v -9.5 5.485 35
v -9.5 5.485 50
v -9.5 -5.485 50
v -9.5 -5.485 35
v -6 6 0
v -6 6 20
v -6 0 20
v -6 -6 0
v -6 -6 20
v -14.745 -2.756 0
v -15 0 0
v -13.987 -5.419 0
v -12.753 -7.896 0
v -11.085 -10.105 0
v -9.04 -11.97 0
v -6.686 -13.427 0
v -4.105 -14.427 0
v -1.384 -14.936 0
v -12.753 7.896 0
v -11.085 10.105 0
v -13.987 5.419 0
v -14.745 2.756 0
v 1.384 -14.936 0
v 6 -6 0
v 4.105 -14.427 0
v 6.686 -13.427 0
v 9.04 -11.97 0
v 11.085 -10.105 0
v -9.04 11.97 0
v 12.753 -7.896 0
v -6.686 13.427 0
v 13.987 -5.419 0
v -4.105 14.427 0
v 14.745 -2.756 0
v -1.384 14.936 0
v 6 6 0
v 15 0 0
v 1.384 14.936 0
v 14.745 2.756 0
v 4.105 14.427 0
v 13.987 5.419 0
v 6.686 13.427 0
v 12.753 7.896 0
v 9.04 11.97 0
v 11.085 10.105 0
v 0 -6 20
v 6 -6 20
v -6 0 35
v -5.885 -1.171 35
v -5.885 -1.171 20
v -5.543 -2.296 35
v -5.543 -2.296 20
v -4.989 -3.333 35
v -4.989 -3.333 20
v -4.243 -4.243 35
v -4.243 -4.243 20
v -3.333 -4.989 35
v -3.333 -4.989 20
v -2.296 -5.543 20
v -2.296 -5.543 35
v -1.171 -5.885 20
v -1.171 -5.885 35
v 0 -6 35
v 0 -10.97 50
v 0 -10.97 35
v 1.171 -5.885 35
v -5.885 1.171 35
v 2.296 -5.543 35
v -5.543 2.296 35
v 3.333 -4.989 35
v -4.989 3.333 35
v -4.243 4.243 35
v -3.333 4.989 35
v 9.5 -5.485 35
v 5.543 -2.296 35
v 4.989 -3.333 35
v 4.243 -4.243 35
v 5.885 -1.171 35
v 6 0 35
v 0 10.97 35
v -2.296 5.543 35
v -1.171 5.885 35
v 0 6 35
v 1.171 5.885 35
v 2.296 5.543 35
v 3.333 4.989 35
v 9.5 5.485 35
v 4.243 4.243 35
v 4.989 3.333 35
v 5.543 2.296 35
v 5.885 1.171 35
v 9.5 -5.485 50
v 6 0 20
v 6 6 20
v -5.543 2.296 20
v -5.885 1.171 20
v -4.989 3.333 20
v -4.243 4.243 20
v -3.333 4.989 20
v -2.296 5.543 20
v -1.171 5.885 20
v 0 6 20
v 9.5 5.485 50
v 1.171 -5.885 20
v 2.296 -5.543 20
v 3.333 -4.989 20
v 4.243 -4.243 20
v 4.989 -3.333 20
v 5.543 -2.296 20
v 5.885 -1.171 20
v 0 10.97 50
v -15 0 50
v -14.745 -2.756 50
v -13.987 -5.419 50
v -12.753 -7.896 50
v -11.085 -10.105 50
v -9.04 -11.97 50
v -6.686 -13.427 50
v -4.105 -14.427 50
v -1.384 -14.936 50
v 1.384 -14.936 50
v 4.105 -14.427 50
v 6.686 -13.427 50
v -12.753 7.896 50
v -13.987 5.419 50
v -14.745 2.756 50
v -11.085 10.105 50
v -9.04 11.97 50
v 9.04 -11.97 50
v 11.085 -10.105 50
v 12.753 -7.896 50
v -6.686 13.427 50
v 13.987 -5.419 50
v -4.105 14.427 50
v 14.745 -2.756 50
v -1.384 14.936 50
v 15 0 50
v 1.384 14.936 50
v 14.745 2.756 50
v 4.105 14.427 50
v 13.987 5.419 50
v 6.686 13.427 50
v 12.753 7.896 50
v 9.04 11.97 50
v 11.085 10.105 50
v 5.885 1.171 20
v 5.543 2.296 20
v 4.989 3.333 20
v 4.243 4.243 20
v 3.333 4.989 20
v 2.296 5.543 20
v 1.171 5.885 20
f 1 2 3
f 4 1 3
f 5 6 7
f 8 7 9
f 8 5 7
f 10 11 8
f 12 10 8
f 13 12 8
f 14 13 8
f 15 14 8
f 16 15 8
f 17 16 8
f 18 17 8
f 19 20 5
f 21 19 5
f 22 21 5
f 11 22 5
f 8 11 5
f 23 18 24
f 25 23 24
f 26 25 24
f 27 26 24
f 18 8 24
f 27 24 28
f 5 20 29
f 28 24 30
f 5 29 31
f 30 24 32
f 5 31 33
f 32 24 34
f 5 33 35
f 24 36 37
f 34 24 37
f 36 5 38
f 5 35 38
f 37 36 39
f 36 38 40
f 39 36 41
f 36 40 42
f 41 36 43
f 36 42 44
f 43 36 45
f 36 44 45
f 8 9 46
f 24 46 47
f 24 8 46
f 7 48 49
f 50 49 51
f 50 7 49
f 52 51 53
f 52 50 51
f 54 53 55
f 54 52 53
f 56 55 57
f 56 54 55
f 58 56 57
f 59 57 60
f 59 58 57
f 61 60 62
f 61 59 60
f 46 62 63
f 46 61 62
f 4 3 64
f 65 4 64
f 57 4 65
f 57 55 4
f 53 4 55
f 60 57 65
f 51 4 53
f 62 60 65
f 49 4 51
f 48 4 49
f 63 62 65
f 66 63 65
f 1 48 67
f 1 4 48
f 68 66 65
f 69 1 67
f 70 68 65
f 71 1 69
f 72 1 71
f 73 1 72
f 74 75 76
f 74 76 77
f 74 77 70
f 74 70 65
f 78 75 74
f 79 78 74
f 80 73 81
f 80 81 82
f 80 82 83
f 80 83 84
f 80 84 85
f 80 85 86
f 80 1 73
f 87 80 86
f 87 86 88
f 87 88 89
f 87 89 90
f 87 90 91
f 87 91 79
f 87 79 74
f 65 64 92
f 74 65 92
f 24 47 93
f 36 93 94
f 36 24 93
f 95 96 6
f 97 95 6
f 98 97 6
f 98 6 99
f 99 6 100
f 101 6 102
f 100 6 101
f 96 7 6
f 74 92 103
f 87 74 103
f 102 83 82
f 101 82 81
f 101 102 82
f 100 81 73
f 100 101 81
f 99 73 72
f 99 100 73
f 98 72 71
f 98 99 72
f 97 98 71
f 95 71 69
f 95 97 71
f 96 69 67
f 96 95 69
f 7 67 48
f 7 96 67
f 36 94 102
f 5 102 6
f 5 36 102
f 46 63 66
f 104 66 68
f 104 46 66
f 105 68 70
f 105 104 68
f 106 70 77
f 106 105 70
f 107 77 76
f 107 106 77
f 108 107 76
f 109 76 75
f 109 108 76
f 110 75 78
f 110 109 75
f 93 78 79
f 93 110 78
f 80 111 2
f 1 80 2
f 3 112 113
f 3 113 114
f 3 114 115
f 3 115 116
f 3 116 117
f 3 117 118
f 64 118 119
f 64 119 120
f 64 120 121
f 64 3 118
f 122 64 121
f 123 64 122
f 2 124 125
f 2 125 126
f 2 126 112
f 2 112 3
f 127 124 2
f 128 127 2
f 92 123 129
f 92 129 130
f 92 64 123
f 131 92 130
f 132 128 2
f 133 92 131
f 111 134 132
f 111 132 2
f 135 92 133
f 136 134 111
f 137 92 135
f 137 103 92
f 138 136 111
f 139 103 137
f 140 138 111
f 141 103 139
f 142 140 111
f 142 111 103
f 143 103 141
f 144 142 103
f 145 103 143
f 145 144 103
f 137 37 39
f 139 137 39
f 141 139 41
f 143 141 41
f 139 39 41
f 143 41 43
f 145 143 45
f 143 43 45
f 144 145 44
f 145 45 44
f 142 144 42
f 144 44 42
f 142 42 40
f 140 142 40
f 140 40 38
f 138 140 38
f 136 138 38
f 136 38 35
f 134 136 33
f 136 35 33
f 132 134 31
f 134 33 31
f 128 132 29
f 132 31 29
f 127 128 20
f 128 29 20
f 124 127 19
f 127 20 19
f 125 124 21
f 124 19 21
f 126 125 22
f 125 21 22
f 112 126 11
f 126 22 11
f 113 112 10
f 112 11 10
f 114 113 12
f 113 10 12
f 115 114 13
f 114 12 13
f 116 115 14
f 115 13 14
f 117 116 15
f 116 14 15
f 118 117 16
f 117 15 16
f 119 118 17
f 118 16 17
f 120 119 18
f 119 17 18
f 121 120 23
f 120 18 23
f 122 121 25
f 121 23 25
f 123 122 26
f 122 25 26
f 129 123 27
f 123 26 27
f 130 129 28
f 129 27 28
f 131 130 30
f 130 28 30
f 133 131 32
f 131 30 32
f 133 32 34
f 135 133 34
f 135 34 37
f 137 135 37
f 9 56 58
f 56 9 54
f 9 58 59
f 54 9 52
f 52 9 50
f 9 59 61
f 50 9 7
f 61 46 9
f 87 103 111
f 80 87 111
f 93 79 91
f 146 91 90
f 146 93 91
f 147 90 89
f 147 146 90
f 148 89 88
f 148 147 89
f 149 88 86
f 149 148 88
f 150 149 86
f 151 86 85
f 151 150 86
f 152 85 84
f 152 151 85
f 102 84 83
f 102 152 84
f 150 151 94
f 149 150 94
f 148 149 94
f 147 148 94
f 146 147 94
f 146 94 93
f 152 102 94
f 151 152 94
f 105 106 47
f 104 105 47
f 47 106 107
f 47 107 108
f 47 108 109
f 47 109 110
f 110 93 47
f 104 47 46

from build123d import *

# Parameters (mm, degrees)
F0_R     = 15
F1_DEPTH = 50
F3_DEPTH = 50.001
F4_DEPTH = 20
F6_DEPTH = 15


with BuildPart() as f1:
    # F0 (on Top) → F1 (new body)
    with BuildSketch(Plane.XY):
        Circle(F0_R)
    extrude(amount=F1_DEPTH)

    # F2 (on Top) → F3 (cut, through all)
    with BuildSketch(Plane.XY):
        with BuildLine():
            ThreePointArc((6, 0), (4.242641, 4.242641), (0, 6))
            ThreePointArc((0, 6), (-4.242641, 4.242641), (-6, 0))
            ThreePointArc((-6, 0), (-4.242641, -4.242641), (0, -6))
            ThreePointArc((0, -6), (4.242641, -4.242641), (6, 0))
        make_face()
    extrude(amount=F3_DEPTH, mode=Mode.SUBTRACT)

    # F2 (on Top) → F4 (cut)
    with BuildSketch(Plane.XY):
        with BuildLine():
            Line((6, 0), (6, 6))
            Line((6, 6), (0, 6))
            ThreePointArc((0, 6), (4.242641, 4.242641), (6, 0))
        make_face()
        with BuildLine():
            ThreePointArc((-6, 0), (-4.242641, 4.242641), (0, 6))
            Line((0, 6), (-6, 6))
            Line((-6, 6), (-6, 0))
        make_face()
        with BuildLine():
            Line((6, -6), (6, 0))
            ThreePointArc((6, 0), (4.242641, -4.242641), (0, -6))
            Line((0, -6), (6, -6))
        make_face()
        with BuildLine():
            ThreePointArc((0, -6), (-4.242641, -4.242641), (-6, 0))
            Line((-6, 0), (-6, -6))
            Line((-6, -6), (0, -6))
        make_face()
    extrude(amount=F4_DEPTH, mode=Mode.SUBTRACT)

    # F5 (on face) → F6 (cut)
    with BuildSketch(Plane.XY.offset(50)):
        Polygon((9.5, 5.484828), (0, 10.969655), (-9.5, 5.484828), (-9.5, -5.484828), (0, -10.969655), (9.5, -5.484828), align=None)
    extrude(amount=-F6_DEPTH, mode=Mode.SUBTRACT)


solid = f1.part
